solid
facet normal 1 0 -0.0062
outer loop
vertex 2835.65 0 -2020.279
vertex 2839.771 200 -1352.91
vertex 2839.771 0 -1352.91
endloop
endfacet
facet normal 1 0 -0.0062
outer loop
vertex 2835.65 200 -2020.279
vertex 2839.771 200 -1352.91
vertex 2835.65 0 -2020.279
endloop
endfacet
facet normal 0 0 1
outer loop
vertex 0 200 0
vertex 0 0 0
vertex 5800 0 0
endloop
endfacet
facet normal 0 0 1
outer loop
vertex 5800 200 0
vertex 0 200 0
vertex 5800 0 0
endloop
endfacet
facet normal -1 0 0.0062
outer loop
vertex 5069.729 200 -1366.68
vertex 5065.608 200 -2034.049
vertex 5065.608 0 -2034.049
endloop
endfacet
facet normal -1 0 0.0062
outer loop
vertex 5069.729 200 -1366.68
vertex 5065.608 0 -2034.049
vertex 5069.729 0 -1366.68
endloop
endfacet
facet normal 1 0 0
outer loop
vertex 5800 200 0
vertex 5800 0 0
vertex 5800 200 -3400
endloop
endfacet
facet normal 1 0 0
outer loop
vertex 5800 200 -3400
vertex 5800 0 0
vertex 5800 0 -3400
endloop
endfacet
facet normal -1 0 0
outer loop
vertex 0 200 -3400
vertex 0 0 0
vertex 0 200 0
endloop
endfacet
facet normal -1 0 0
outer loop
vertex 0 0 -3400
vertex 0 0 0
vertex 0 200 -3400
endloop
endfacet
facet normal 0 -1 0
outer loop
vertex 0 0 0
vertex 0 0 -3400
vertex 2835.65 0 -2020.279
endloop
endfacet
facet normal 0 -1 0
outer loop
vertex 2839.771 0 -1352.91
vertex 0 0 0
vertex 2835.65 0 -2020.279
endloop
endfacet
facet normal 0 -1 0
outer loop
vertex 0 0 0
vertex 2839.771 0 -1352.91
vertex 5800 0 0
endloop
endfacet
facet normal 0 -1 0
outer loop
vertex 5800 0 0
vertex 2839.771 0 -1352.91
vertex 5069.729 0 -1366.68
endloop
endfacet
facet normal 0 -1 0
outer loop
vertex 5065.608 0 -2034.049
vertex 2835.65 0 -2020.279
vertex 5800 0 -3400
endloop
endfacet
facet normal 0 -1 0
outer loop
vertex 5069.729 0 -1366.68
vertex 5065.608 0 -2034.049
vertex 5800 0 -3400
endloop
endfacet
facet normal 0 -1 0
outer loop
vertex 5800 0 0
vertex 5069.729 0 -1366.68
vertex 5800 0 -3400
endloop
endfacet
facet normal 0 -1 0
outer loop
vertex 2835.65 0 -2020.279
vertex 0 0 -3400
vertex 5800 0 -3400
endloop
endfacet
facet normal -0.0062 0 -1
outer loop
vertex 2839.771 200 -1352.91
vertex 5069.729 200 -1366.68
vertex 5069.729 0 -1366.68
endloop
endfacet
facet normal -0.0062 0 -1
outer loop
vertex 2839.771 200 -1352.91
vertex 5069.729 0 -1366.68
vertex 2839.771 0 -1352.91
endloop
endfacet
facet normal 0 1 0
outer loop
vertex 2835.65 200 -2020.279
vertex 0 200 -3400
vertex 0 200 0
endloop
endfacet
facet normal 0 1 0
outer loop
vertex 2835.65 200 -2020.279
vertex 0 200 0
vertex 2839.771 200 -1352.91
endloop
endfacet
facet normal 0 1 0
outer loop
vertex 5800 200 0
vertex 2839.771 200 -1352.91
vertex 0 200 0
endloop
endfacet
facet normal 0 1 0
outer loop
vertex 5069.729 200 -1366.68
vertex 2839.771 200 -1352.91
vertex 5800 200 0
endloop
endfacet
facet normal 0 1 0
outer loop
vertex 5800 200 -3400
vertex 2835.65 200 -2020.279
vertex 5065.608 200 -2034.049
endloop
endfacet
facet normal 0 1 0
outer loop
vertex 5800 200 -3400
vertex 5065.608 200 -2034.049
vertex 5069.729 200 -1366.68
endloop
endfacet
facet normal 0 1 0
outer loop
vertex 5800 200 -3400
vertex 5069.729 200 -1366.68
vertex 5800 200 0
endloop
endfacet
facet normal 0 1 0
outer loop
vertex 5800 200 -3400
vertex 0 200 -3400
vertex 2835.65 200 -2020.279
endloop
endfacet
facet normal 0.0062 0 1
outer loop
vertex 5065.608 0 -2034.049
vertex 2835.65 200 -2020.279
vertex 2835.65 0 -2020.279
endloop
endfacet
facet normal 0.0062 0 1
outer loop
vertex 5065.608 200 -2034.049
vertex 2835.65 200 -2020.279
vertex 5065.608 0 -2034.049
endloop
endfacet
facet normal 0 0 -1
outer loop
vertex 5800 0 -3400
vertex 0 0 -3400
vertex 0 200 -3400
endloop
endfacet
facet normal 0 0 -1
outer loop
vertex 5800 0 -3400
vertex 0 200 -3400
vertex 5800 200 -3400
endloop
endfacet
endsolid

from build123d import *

# Parameters (mm, degrees)
SKETCH_1_W          = 5800
SKETCH_1_H          = 3400
EXTRUDE_1_DEPTH     = 200
CUT_EXTRUDE_1_DEPTH = 200


with BuildPart() as part:
    # Эскиз1 → Бобышка-Вытянуть1 (new body)
    with BuildSketch(Plane(origin=(0, 0, 0), x_dir=(1, 0, 0), z_dir=(0, 1, 0))):
        with Locations((2900, 1700)):
            Rectangle(SKETCH_1_W, SKETCH_1_H)
    extrude(amount=EXTRUDE_1_DEPTH)

    # Эскиз2 → Вырез-Вытянуть1 (cut)
    with BuildSketch(Plane(origin=(0, 200, 0), x_dir=(1, 0, 0), z_dir=(0, 1, 0))):
        Polygon((2835.64978703, 2020.278779221), (5065.60825261, 2034.049335389), (5069.729424565, 1366.68033616), (2839.770958985, 1352.909779993), align=None)
    extrude(amount=-CUT_EXTRUDE_1_DEPTH, mode=Mode.SUBTRACT)


solid = part.part
